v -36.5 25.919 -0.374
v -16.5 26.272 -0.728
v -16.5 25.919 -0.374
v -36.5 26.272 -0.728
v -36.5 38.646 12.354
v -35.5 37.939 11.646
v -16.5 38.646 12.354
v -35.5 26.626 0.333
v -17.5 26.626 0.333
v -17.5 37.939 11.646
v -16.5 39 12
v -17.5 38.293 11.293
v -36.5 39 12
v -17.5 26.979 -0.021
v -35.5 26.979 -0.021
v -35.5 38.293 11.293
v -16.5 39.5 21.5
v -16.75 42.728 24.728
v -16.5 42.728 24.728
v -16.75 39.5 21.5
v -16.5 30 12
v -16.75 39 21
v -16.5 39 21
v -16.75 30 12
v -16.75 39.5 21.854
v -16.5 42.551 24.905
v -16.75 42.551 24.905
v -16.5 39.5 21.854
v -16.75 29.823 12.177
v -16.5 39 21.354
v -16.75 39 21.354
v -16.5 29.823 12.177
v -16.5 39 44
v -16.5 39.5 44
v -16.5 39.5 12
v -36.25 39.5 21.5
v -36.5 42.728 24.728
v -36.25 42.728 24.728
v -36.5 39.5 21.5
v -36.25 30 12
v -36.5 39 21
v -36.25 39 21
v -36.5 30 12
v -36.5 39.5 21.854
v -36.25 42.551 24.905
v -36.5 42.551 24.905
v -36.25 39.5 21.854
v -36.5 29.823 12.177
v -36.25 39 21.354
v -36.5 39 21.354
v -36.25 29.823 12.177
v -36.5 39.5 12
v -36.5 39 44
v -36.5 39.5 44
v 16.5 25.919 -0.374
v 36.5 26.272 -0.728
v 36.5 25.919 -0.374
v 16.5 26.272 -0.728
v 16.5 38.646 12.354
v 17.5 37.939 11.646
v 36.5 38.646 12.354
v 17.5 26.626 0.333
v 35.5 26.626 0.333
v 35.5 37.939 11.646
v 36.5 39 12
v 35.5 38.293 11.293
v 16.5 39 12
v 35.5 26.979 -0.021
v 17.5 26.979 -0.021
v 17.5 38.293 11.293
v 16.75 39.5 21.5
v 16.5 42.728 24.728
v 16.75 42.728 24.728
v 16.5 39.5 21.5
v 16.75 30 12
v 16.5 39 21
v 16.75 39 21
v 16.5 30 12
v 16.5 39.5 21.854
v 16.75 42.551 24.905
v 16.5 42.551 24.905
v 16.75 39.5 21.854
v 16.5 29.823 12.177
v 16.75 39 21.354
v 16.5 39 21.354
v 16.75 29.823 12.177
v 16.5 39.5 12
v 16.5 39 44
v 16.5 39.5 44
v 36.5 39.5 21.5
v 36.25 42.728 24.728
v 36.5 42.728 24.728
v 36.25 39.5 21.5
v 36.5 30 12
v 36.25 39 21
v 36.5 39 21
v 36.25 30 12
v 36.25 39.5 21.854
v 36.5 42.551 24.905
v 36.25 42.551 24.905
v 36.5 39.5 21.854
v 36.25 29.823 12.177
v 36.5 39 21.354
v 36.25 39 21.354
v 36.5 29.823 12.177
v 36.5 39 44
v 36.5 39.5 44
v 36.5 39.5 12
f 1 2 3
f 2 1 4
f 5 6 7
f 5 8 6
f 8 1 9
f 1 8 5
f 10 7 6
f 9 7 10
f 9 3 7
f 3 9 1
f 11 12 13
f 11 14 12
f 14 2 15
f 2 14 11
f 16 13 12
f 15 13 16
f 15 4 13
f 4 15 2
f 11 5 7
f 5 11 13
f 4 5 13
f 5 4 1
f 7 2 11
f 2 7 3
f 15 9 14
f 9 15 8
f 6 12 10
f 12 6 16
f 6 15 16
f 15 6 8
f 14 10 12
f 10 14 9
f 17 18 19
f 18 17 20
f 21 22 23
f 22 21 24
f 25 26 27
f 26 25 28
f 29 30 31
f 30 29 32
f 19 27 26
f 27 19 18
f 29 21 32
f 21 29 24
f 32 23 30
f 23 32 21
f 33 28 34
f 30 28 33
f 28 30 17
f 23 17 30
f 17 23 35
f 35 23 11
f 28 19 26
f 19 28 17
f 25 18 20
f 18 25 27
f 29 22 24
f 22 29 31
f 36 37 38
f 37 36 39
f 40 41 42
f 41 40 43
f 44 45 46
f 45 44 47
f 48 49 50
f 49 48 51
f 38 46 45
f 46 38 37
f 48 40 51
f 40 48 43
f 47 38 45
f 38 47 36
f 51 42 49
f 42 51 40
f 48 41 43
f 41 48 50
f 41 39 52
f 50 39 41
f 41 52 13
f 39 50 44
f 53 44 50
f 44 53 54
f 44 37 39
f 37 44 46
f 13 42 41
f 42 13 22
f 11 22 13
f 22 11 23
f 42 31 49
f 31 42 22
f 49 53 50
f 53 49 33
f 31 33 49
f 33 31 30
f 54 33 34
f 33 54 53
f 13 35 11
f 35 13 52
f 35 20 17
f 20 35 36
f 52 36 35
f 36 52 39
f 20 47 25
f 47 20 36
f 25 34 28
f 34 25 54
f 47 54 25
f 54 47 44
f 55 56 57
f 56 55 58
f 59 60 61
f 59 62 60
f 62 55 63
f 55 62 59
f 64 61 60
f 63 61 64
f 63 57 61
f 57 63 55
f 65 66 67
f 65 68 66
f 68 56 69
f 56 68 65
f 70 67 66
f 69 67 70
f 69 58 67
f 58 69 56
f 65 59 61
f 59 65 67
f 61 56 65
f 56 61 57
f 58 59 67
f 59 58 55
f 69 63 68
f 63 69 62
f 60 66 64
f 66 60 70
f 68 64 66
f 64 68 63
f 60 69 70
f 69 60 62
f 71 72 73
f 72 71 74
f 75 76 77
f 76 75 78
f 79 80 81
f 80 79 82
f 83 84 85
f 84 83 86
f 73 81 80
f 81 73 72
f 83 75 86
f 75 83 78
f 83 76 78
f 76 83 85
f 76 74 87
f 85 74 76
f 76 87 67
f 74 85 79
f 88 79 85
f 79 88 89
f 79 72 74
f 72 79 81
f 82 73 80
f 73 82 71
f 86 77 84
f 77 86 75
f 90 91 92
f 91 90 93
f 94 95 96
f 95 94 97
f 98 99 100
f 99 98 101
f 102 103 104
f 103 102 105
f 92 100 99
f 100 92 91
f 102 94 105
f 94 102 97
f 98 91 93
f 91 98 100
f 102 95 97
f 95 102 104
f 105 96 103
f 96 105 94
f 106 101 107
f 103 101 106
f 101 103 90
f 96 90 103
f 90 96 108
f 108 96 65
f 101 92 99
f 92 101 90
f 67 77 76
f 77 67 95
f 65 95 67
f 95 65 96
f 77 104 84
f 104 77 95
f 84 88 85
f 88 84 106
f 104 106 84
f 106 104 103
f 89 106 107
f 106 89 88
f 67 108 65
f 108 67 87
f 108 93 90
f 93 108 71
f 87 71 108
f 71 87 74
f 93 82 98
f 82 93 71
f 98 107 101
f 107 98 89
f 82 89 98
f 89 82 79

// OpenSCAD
// ============================================================================
// MODULE: HIGH-LOAD ARTICULATED TWO-SEATER COLLAPSIBLE CREW CHAIR MATRIX
// REPOSITORY PATH: src/folding_chairs.scad
// ARCHITECTURE: ZERO-FASTENER SCISSOR-TRUSS INTEGRATED CABIN LAYOUT
// COMPLIANCE: 0.062" FRAME SKELETON MOUNTING / LOCKS TRUSS LOADS TO BASE LOOP
// ============================================================================

$fn = 120; // Maintain smooth bearing cuts for high-G dynamic joint analysis

// --- CHAIR MECHANICAL PARAMETERS (INCHES) ---
SKELETON_RIB_CEILING = 0.062; // Regulated framing thickness floor
CHAIR_SEAT_W = 20.0;          // Ergonomic seat pan width clearance
CHAIR_SEAT_L = 18.0;          // Seat pan depth footprint length
CHAIR_BACK_H = 32.0;          // Backrest vertical support profile scale
LINK_BAR_T = 0.250;           // 1/4" thick heavy-duty scissor link bars
IS_DEPLOYED = true;           // TOGGLE VARIABLE: True = Flight Position, False = Folded Flat

module CollapsibleCrewChair(deployed_state) {
    echo("CNC Toolpath: Fabricating Articulated Scissor-Truss Fold-Out Chair Base");
    
    // Calculate rotational kinematics based on toggle state variables
    pivot_angle = (deployed_state) ? 45.0 : 0.0;
    slide_offset_z = (deployed_state) ? 0.0 : 16.0;
    
    color("Silver")
    union() {
        // 1. MAIN COMFORT SEAT PAN PANEL
        translate([0, 0, slide_offset_z])
        rotate([0, pivot_angle, 0])
        difference() {
            // High-strength stamped alloy seat plate
            cube([CHAIR_SEAT_L, CHAIR_SEAT_W, 0.50]);
            // Internal pocket weight-reduction cutouts
            translate([1.0, 1.0, -0.1])
            cube([CHAIR_SEAT_L - 2.0, CHAIR_SEAT_W - 2.0, 0.7]);
        }
        
        // 2. BACKREST SUPPORT BULKHEAD
        translate([-0.50, 0, slide_offset_z])
        cube([0.50, CHAIR_SEAT_W, CHAIR_BACK_H]);
        
        // 3. HIGH-LOAD COMPRESSION SCISSOR LINKS (Bolt-Free Hinge Pins)
        color("DarkSlateGray")
        for (side_offset = [0, CHAIR_SEAT_W - LINK_BAR_T]) {
            translate([CHAIR_SEAT_L / 2, side_offset, slide_offset_z / 2])
            rotate([0, -pivot_angle, 0])
            cube([LINK_BAR_T, LINK_BAR_T, 18.0]); // Load-bearing strut bars
        }
    }
}

module ArraySymmetricFoldingSeats(cabin_radius) {
    // Spawns the twin chairs symmetrically for the Left Pilot and Right Co-Pilot stations
    for (crew_axis = [-1, 1]) {
        scale([crew_axis, 1, 1])
        translate([16.5, cabin_radius - 19.5, 12.0]) // Aligned low over the floor matrix
        rotate([0, 0, -90])
        CollapsibleCrewChair(deployed_state = IS_DEPLOYED);
    }
}

// ============================================================================
// CNC WORKSTATION FIELD VERIFICATION VIEWPORT DISPLAY
// ============================================================================
// Simulates structural layout check inside the 120-inch Titan Mark III pressure can
ArraySymmetricFoldingSeats(cabin_radius = 58.5);
